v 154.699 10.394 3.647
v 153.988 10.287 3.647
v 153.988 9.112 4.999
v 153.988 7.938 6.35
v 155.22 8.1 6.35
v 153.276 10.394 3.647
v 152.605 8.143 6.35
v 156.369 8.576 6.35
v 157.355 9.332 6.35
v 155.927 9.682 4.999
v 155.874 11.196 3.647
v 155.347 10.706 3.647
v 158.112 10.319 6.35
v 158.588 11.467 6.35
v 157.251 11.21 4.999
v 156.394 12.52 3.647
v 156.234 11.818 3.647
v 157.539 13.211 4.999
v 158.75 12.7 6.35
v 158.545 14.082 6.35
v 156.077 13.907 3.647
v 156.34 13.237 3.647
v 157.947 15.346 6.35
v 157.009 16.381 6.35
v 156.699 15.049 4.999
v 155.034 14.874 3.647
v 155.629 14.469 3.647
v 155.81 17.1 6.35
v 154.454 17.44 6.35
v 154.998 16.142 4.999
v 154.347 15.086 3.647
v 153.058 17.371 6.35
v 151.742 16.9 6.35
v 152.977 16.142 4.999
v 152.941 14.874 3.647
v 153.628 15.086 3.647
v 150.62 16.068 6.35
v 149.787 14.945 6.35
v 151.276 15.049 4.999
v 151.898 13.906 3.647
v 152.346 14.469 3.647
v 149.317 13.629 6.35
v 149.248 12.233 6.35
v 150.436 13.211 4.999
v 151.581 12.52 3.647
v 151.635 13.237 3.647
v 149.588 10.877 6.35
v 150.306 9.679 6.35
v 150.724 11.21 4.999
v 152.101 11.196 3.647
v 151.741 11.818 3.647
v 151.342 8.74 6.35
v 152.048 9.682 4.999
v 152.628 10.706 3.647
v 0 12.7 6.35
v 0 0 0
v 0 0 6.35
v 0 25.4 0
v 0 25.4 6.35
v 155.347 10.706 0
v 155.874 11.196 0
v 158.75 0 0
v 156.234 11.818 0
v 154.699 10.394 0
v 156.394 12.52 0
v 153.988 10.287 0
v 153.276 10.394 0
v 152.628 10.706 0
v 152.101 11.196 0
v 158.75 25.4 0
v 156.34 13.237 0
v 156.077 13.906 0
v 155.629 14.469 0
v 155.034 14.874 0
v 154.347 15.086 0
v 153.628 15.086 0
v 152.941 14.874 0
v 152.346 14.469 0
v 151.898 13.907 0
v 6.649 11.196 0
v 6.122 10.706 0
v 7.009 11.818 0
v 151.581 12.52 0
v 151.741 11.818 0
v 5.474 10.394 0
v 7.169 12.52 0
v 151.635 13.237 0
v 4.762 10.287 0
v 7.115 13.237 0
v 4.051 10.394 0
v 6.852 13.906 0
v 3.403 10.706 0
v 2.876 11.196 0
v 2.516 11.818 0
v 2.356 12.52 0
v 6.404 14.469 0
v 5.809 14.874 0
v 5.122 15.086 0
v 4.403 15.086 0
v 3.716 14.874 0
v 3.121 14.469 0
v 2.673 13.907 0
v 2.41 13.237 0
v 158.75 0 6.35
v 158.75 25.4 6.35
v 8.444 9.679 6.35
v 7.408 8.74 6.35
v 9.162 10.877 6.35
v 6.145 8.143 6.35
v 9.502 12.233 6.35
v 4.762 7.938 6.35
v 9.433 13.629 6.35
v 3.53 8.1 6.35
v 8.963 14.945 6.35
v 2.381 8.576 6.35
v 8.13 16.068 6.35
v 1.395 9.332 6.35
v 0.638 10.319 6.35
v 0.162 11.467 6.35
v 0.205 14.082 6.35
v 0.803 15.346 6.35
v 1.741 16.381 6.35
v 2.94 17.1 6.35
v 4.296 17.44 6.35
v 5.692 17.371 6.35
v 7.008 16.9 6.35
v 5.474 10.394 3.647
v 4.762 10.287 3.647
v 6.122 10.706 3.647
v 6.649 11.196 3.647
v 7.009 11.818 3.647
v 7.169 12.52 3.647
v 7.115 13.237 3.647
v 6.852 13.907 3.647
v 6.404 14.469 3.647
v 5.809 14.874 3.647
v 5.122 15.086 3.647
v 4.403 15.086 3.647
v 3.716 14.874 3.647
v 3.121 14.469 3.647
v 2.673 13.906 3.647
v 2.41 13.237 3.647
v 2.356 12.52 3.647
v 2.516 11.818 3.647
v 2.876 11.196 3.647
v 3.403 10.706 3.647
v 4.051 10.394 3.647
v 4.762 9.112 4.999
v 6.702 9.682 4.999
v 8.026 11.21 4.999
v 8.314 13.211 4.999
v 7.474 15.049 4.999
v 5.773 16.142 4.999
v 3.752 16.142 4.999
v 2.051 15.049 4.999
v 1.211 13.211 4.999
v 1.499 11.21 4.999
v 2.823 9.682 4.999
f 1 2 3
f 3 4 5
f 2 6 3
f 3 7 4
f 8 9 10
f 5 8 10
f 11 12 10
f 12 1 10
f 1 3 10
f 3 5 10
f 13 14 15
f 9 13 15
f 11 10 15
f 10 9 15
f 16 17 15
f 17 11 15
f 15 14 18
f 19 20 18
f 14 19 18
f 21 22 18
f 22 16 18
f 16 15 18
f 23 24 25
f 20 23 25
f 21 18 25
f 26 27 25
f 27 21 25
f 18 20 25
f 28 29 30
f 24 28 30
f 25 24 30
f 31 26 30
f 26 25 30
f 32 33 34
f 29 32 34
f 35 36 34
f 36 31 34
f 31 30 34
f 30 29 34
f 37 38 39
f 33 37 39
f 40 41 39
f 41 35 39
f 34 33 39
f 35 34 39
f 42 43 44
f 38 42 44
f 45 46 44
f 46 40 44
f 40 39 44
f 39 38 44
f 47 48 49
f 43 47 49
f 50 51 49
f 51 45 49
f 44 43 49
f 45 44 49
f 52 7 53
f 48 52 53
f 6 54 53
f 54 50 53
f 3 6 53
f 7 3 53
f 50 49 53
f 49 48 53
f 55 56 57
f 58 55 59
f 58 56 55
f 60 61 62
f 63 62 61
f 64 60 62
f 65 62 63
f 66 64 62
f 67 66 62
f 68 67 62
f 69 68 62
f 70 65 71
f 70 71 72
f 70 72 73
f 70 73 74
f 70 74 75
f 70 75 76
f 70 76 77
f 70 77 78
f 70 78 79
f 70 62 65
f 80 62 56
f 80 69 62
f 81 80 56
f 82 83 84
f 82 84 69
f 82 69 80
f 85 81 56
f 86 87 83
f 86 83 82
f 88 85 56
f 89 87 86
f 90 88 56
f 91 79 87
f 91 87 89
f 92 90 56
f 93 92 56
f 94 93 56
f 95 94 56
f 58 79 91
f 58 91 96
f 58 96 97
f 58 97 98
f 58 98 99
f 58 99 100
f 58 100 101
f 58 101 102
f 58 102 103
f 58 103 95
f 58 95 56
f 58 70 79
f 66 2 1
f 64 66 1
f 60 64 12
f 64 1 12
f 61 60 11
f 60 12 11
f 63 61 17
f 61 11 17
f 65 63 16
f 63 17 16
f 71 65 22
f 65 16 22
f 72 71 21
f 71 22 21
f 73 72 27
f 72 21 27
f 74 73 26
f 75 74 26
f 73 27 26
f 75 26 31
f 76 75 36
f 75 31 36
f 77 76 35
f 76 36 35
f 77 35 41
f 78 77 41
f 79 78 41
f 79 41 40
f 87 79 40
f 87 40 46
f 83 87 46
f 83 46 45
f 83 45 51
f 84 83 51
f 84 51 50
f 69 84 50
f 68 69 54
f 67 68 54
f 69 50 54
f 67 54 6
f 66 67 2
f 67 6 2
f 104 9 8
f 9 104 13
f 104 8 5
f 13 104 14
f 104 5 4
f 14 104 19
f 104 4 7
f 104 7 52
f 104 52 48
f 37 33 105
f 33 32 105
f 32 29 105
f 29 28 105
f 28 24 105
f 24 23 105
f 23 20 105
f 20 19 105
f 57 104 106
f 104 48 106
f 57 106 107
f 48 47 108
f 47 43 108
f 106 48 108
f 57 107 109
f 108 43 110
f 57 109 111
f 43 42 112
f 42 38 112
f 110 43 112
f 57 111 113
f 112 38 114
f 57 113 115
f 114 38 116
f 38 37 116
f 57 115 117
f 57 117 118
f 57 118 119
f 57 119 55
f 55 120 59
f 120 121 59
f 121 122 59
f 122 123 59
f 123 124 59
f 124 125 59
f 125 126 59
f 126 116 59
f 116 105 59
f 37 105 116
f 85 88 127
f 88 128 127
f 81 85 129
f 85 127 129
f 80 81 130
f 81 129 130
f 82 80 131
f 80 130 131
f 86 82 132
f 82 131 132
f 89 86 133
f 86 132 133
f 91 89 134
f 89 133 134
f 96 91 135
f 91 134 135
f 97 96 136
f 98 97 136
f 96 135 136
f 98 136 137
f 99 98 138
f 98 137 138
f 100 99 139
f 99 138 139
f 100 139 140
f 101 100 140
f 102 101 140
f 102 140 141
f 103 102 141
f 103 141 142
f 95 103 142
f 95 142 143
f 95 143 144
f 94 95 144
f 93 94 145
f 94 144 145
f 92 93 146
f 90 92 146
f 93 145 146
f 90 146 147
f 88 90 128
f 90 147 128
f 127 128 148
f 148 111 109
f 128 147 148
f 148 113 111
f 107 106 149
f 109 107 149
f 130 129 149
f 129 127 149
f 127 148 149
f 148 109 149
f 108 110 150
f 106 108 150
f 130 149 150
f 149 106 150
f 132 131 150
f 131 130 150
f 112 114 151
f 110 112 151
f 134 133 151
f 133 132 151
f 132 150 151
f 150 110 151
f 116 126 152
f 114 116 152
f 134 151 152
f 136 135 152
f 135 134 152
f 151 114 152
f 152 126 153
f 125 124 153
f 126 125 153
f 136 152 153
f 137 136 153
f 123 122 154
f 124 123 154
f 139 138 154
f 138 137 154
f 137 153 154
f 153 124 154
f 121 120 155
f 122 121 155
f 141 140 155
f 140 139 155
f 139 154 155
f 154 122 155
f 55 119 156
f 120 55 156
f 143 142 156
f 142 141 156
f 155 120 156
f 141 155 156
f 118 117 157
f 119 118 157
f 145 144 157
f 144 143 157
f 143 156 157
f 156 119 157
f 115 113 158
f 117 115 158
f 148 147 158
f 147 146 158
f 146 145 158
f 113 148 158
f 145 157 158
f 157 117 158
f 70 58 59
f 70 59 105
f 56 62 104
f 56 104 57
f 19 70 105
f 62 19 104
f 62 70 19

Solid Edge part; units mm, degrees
sketch "Sketch1" plane through (0, 0, 0) normal (0, 0, 1) x (1, 0, 0)
  line L0 (0, 0) -> (0, 25.4)
  line L1 (0, 25.4) -> (158.75, 25.4)
  line L2 (158.75, 25.4) -> (158.75, 0)
  line L3 (158.75, 0) -> (0, 0)
  dimension "D1" = 158.75
  dimension "D2" = 25.4
extrude "Protrusion1" add sketch "Sketch1" along normal blind 6.35
hole "Hole_1" at (153.9875, 12.7, 6.35) direction (0, 0, -1) diameter 4.826 end up to next countersink diameter 9.525 countersink angle 82
hole "Hole1" at (4.7625, 12.7, 6.35) direction (0, 0, -1) diameter 4.826 end up to next countersink diameter 9.525 countersink angle 82
properties part number "CHAS-03"
